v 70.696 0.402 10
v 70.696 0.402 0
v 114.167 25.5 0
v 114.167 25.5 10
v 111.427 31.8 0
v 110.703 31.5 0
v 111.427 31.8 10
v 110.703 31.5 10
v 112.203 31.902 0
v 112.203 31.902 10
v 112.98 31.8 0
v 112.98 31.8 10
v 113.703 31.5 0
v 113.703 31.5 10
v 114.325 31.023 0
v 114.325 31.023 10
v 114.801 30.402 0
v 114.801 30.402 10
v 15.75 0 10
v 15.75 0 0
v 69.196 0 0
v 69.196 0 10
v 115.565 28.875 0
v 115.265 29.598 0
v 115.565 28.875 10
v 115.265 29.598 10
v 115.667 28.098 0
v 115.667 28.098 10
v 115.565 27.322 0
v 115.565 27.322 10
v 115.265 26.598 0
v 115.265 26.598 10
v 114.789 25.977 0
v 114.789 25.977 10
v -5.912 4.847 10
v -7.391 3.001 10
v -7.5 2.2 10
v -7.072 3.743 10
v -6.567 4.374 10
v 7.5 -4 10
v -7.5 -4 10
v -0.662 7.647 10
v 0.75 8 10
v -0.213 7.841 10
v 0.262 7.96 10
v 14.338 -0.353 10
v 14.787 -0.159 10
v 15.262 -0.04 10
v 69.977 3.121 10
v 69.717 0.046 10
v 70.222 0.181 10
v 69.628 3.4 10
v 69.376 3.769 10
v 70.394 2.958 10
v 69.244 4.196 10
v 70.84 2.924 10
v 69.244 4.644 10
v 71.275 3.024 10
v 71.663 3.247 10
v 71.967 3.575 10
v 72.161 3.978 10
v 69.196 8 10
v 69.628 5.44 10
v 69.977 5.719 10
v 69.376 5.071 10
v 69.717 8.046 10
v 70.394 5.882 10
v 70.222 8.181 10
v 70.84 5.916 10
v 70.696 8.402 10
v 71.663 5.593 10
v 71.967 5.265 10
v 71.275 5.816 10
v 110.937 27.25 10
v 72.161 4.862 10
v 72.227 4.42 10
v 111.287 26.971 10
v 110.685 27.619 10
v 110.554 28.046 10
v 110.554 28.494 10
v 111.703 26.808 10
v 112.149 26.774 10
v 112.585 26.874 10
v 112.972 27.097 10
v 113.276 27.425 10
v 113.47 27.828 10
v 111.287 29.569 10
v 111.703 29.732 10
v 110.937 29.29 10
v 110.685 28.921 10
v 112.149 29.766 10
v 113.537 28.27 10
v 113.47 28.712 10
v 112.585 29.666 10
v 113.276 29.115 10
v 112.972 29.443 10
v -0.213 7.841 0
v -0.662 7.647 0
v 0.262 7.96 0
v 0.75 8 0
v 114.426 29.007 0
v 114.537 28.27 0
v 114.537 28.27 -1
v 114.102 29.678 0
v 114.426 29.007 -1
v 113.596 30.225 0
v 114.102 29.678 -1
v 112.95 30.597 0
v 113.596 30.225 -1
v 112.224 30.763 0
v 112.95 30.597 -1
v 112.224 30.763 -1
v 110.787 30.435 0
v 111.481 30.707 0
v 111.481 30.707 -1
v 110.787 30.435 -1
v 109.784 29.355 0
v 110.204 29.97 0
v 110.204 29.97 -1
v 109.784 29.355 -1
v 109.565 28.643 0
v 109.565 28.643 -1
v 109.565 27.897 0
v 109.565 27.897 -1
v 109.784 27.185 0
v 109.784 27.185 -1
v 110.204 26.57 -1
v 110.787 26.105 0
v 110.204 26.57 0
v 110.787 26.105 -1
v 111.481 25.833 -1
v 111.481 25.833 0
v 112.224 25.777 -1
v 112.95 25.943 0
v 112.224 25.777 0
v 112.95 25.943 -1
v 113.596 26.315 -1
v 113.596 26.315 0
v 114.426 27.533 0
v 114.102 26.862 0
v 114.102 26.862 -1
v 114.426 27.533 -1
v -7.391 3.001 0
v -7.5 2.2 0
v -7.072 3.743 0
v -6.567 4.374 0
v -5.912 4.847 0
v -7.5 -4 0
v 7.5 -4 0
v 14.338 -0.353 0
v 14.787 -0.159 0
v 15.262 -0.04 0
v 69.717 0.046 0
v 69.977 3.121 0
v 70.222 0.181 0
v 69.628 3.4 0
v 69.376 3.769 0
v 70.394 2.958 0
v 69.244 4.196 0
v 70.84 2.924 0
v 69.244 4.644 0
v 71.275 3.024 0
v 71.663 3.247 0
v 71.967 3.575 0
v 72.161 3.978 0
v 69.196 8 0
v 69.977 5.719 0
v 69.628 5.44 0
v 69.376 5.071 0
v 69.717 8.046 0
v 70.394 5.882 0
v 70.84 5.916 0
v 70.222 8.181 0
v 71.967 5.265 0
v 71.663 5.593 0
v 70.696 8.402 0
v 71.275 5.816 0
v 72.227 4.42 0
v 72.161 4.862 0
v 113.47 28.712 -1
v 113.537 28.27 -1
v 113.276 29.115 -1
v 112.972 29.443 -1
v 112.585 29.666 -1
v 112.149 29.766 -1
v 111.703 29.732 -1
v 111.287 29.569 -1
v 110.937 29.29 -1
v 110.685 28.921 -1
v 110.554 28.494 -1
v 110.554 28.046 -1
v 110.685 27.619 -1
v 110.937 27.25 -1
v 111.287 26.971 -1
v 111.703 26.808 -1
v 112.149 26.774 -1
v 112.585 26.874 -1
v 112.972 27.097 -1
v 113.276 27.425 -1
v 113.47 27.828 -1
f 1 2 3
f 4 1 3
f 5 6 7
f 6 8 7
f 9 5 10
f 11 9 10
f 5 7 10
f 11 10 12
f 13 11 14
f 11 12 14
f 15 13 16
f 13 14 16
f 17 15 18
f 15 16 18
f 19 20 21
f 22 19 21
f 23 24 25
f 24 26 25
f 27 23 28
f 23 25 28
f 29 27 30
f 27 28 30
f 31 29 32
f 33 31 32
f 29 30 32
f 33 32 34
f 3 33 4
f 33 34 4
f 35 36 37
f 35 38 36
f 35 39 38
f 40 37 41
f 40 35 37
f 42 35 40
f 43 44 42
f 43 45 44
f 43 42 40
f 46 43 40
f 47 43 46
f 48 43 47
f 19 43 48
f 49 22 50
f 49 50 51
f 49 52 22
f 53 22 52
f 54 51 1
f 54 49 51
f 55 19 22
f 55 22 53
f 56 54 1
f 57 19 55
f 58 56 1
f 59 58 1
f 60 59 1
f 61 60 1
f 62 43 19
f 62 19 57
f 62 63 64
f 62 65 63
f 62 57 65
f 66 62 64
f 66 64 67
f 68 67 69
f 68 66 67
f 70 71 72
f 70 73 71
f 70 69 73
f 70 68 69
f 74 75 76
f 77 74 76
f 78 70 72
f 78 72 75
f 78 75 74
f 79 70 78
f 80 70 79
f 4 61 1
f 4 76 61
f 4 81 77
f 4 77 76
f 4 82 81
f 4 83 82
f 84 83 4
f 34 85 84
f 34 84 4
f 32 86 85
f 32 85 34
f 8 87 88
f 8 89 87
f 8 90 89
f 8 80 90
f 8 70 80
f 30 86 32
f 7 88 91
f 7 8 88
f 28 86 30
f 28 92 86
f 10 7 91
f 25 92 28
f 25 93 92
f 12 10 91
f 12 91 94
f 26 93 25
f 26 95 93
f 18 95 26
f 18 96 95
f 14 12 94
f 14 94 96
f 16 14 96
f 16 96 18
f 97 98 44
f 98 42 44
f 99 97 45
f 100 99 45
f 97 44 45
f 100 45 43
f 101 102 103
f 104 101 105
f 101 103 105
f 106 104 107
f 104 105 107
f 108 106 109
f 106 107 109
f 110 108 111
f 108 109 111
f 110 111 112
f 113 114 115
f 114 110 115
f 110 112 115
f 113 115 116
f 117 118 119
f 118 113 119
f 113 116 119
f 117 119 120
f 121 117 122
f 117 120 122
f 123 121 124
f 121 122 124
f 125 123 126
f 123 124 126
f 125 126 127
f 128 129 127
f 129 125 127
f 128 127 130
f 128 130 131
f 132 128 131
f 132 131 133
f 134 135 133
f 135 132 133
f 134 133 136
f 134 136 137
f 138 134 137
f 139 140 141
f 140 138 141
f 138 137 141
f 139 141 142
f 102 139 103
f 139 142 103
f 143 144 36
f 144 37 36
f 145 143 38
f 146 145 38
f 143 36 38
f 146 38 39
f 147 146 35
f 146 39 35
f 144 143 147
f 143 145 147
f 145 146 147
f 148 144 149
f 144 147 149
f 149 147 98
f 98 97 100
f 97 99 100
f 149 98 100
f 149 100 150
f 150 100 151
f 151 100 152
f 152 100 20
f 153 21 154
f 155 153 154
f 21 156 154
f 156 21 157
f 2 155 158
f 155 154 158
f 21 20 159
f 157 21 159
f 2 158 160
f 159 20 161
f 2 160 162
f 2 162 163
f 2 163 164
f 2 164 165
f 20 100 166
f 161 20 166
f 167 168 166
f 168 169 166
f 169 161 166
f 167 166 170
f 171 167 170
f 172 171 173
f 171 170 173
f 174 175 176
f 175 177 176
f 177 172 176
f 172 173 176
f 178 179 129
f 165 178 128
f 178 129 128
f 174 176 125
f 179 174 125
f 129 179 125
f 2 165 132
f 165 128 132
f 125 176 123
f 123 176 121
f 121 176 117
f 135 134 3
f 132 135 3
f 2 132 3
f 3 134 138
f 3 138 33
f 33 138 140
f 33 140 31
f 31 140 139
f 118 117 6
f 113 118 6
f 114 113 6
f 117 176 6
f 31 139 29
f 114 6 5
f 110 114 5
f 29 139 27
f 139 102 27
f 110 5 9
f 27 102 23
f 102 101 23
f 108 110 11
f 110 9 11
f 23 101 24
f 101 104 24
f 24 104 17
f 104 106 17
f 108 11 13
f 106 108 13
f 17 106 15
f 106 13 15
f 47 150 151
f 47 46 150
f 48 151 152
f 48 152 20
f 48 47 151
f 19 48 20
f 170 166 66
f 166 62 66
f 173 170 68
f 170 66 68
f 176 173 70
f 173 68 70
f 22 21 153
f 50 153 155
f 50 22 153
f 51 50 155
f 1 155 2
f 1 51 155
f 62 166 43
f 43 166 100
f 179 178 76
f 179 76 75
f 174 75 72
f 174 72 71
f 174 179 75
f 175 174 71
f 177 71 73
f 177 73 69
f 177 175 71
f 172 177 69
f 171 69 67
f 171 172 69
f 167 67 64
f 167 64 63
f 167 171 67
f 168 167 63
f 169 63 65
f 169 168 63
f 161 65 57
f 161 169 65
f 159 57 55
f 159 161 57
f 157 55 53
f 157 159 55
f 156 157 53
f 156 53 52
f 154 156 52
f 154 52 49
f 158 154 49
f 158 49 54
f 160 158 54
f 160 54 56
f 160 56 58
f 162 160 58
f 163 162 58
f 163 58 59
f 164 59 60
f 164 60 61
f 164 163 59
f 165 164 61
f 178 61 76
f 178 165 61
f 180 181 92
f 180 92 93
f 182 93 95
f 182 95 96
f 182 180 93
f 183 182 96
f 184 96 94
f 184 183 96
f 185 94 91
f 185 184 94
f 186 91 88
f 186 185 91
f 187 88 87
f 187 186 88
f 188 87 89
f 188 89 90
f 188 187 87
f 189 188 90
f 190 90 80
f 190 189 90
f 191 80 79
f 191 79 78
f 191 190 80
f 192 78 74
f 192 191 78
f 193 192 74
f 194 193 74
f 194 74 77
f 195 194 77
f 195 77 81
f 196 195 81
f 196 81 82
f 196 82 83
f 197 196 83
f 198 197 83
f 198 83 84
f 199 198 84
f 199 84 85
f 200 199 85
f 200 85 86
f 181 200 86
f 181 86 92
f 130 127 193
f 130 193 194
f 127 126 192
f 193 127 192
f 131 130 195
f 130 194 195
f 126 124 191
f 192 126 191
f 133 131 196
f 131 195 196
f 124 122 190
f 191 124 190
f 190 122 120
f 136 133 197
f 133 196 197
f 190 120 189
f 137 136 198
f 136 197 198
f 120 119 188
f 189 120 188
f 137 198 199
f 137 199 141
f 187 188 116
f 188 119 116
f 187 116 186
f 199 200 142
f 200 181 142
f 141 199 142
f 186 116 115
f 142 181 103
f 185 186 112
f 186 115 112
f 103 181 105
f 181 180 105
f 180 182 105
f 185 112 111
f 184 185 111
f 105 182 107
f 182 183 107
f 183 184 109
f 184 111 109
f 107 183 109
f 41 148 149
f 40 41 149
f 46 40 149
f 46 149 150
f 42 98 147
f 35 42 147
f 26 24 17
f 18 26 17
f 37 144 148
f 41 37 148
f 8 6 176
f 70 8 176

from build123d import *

# Parameters (mm, degrees)
SKETCH_1_R      = 1.5
EXTRUDE_1_DEPTH = 10
FILLET_1_R      = 3
EXTRUDE_START   = -11
SKETCH_2_R      = 2.5
SKETCH_2_R_2    = 1.5
EXTRUDE_2_DEPTH = 11


with BuildPart() as part:
    # 草图1 → 凸台-拉伸1 (new body)
    with BuildSketch(Plane.XY):
        Polygon((-7.5, 4), (-7.5, -4), (7.5, -4), (15, 0), (70, 0), (116.765371804, 27), (113.301270189, 33), (70, 8), (0, 8), align=None)
        with Locations((112.0368731, 28.27)):
            Circle(SKETCH_1_R, mode=Mode.SUBTRACT)
        with Locations((70.727461339, 4.42)):
            Circle(SKETCH_1_R, mode=Mode.SUBTRACT)
    extrude(amount=EXTRUDE_1_DEPTH)

    # 圆角1
    fillet_1_edges = [part.edges().sort_by_distance(p)[0] for p in [
        (-7.5, 4, 5),
        (0, 8, 5),
        (70, 8, 5),
        (113.301270189, 33, 5),
        (116.765371804, 27, 5),
        (70, 0, 5),
        (15, 0, 5),
    ]]
    fillet(fillet_1_edges, radius=FILLET_1_R)

    # 草图2 → 凸台-拉伸2 (add)
    with BuildSketch(Plane.XY.offset(10).offset(EXTRUDE_START)):
        with Locations((112.0368731, 28.27)):
            Circle(SKETCH_2_R)
        with Locations((112.0368731, 28.27)):
            Circle(SKETCH_2_R_2, mode=Mode.SUBTRACT)
    extrude(amount=EXTRUDE_2_DEPTH)


solid = part.part
